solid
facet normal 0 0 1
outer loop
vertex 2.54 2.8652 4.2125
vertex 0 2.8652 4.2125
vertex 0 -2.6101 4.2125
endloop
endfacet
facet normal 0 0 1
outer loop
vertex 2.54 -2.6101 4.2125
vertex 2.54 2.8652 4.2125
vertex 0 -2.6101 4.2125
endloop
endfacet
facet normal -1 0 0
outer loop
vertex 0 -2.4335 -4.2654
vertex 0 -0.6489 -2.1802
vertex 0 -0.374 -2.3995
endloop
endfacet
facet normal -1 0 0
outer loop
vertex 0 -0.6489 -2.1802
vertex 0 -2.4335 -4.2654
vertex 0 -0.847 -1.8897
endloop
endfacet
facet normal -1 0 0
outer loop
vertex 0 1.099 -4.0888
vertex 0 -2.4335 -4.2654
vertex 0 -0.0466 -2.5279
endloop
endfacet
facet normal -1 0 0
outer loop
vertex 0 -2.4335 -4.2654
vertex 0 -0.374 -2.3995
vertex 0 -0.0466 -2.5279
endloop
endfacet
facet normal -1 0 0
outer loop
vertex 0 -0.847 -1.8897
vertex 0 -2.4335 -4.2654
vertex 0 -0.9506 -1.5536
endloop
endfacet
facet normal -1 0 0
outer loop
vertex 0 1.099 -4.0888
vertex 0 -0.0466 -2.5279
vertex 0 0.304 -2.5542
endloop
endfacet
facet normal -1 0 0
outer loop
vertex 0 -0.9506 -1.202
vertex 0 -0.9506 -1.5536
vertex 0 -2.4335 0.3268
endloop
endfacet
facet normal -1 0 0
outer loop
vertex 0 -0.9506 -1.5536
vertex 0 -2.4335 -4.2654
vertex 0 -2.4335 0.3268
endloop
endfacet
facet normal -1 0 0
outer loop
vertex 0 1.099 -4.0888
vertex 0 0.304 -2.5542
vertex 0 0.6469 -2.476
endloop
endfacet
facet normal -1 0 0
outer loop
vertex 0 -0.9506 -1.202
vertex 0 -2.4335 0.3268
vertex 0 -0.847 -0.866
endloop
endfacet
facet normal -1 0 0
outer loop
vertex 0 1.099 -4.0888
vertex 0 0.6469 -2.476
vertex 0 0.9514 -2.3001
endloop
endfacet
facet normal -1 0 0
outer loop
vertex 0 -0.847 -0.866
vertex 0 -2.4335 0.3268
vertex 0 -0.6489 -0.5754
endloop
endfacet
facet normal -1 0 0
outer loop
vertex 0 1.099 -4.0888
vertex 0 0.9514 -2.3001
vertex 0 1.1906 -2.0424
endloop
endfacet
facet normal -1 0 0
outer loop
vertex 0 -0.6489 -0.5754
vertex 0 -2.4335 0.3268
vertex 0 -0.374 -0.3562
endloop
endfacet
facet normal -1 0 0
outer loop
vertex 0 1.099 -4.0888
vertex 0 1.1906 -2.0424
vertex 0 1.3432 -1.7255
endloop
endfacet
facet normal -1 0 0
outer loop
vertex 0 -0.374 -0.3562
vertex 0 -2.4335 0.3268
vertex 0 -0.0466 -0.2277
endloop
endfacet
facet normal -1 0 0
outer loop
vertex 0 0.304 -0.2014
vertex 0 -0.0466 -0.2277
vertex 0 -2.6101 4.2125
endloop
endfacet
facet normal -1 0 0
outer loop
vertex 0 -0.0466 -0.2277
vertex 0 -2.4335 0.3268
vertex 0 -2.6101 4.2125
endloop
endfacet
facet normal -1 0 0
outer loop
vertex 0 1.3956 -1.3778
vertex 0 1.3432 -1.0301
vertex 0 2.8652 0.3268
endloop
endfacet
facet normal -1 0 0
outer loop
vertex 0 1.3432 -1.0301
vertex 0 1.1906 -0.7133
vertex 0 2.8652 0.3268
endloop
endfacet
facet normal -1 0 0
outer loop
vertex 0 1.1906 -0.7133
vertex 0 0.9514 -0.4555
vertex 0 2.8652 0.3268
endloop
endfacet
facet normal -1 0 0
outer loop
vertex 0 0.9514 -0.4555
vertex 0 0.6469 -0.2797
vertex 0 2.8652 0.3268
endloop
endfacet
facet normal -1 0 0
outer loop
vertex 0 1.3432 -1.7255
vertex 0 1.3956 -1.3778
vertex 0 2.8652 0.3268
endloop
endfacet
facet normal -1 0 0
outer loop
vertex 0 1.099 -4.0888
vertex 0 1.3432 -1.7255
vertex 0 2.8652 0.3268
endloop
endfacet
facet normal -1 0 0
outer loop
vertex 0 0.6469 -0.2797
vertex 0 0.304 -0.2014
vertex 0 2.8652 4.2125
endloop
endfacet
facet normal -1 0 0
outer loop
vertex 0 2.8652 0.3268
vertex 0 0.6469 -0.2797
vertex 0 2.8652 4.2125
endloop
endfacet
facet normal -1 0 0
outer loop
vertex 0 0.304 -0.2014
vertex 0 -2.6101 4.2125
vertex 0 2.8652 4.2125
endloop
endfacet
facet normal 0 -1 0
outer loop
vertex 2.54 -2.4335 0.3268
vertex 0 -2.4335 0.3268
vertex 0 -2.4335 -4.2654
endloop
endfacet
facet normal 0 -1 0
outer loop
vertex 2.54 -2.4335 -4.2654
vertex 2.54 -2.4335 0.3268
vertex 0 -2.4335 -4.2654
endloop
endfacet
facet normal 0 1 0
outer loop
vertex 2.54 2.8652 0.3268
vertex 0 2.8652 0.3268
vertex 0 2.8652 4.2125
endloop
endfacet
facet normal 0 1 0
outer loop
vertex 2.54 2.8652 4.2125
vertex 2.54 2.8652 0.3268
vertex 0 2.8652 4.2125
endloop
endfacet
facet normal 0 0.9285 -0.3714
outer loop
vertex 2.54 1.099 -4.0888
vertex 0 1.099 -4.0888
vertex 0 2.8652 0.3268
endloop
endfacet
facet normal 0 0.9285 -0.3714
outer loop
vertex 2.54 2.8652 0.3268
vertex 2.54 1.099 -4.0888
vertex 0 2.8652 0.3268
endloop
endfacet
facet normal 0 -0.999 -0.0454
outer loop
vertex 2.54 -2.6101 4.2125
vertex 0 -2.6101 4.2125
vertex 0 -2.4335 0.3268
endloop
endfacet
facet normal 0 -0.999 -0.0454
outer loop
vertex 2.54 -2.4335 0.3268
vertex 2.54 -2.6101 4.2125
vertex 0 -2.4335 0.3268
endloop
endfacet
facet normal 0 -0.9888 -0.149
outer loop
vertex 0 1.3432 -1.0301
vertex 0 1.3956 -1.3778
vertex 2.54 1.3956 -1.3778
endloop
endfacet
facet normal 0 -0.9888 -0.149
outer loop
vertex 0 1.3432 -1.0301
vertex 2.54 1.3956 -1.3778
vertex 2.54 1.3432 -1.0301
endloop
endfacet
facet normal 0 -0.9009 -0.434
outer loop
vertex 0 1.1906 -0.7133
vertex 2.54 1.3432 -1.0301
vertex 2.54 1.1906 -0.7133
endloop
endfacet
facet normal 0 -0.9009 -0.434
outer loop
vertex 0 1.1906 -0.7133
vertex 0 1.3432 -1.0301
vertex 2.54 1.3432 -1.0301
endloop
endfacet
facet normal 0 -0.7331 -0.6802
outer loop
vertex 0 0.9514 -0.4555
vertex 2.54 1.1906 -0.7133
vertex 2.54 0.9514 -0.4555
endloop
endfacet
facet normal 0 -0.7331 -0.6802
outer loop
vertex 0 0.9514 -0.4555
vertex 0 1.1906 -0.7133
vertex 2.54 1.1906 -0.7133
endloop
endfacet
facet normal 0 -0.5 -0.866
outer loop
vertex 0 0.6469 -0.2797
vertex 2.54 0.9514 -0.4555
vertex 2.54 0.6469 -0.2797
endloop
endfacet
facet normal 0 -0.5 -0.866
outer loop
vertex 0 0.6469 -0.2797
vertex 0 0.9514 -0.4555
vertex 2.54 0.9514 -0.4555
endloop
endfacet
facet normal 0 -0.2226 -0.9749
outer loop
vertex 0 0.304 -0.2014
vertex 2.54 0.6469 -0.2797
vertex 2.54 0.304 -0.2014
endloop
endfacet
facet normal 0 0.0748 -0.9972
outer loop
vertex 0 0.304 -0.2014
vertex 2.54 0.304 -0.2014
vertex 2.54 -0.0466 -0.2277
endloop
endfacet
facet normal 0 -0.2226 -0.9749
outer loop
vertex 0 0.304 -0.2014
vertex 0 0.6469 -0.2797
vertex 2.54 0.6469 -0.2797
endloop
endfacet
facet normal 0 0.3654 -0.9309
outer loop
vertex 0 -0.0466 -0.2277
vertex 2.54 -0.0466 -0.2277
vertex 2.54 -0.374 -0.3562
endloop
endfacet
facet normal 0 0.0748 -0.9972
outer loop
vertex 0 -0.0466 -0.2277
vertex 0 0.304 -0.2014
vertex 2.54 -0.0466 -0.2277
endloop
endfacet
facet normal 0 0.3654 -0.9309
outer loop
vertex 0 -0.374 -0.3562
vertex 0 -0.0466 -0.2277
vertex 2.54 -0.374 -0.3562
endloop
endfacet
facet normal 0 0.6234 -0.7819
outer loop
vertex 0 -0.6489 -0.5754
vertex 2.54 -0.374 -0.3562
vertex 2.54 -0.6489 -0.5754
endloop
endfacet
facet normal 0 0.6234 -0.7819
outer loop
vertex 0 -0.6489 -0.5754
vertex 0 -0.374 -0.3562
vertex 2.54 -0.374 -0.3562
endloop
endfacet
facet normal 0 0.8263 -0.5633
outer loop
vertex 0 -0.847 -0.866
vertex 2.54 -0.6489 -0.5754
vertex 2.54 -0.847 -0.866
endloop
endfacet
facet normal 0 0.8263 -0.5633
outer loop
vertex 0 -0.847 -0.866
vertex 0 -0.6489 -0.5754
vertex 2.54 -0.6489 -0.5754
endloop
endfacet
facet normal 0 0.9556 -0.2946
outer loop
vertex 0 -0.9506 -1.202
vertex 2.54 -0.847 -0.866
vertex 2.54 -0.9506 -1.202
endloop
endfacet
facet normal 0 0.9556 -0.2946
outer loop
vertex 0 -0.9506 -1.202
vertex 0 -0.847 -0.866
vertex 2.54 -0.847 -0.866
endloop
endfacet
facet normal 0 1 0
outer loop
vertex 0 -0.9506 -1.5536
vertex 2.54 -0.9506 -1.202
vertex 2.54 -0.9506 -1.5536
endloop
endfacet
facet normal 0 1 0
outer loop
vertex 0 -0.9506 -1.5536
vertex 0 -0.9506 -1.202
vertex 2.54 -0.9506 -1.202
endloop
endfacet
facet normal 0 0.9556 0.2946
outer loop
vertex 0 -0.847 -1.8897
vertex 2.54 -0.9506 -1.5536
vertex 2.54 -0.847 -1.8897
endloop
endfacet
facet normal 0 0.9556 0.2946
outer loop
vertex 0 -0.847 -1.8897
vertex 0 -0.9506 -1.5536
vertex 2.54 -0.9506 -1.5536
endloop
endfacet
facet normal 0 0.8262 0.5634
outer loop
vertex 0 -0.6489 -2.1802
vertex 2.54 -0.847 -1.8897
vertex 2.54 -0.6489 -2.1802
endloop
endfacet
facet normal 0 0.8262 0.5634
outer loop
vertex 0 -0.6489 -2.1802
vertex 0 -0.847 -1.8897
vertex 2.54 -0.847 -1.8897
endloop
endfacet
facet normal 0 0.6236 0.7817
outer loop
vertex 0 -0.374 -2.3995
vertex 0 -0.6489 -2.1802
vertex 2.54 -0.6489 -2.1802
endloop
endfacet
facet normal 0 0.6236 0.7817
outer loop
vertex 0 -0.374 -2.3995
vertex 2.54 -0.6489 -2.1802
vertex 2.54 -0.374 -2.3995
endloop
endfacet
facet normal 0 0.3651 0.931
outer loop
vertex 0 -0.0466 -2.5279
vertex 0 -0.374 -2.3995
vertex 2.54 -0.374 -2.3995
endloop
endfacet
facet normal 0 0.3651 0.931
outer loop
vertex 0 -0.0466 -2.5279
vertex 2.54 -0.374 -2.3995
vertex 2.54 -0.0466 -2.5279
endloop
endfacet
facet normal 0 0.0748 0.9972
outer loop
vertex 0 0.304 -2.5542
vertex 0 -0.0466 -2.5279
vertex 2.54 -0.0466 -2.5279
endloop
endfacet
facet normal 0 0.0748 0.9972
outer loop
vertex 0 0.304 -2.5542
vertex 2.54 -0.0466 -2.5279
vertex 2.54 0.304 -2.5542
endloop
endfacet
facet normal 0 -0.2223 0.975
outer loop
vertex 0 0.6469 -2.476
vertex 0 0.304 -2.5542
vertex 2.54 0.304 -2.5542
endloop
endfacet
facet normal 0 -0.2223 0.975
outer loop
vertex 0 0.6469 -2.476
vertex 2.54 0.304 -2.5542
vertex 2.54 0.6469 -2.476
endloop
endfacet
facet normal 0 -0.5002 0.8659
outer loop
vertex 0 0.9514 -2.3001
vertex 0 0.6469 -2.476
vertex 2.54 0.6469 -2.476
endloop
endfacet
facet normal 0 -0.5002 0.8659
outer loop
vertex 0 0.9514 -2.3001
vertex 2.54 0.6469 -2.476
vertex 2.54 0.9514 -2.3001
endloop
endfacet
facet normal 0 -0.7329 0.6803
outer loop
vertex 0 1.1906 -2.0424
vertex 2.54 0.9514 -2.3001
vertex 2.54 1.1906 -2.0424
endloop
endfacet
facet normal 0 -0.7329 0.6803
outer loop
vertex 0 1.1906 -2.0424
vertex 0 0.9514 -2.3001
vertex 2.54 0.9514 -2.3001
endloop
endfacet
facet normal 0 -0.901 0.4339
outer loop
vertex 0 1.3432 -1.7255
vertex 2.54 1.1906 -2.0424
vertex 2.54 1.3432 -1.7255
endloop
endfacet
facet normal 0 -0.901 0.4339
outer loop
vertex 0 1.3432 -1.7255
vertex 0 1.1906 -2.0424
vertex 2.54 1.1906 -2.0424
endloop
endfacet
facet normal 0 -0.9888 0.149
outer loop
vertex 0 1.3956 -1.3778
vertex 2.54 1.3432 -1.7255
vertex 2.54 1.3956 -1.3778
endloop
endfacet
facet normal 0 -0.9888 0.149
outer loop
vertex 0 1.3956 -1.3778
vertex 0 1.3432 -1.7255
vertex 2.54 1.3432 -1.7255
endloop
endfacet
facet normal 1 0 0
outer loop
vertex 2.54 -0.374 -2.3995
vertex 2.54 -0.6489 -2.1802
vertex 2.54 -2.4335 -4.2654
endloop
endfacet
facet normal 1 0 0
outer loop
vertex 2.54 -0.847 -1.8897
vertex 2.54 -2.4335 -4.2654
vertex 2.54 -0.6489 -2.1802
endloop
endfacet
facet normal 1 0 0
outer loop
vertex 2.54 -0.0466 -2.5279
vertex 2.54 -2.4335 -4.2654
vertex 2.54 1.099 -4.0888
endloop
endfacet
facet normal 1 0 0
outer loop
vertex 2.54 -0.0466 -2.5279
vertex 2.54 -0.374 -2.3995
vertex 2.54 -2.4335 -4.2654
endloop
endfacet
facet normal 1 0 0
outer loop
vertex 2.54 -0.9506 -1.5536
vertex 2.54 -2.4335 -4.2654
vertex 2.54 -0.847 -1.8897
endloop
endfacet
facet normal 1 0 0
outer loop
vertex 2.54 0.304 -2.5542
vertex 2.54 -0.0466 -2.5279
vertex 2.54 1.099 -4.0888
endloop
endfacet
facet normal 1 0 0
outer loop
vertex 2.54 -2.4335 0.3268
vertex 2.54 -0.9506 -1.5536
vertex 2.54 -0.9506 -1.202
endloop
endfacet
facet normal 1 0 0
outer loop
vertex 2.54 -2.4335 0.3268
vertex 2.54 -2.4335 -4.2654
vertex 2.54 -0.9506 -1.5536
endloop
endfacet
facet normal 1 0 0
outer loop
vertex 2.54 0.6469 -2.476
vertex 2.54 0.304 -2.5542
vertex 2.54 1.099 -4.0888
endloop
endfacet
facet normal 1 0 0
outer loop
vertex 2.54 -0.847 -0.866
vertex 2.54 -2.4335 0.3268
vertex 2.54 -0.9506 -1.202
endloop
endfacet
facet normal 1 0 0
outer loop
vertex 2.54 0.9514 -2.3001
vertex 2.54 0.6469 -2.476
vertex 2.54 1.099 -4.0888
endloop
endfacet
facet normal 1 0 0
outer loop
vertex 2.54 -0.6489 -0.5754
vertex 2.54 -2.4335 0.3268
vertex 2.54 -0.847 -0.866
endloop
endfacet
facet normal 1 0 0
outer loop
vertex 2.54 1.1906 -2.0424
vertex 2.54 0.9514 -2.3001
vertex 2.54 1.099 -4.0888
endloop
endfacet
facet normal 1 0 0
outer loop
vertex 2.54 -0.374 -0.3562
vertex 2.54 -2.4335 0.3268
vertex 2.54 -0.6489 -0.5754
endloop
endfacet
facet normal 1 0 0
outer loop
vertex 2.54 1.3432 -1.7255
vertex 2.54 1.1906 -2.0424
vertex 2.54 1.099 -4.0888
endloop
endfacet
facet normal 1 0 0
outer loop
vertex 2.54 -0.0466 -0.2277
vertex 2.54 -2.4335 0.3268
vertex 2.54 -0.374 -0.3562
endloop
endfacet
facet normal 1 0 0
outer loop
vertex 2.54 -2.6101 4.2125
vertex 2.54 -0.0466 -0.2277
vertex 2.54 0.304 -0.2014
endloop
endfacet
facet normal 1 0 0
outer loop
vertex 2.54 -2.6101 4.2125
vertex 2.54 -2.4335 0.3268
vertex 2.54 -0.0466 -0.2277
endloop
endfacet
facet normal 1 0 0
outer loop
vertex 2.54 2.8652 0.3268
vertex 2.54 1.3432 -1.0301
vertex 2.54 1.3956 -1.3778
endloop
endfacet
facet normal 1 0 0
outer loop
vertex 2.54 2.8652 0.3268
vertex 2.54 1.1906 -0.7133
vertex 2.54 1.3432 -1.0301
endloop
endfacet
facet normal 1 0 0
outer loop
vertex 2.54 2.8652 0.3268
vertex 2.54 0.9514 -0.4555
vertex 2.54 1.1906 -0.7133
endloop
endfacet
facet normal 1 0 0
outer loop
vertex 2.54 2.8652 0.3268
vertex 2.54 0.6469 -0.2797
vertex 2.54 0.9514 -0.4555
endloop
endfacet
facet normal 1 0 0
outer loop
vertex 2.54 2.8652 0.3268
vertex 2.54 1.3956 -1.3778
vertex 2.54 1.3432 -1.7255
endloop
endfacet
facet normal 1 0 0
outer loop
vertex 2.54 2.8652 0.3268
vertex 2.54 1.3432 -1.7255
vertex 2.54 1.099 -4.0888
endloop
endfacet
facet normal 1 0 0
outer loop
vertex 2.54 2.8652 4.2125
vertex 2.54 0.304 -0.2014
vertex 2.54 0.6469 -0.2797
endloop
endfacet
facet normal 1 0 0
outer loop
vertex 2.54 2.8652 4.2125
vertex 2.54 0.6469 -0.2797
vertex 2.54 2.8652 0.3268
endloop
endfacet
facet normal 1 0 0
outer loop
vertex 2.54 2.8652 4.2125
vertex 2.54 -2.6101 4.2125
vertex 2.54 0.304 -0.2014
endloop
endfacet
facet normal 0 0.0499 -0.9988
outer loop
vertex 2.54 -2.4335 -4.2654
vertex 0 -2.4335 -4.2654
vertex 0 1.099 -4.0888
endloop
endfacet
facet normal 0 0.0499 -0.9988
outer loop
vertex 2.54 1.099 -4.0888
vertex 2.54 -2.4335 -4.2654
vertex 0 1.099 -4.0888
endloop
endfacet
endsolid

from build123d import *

# Parameters (mm, degrees)
F0_R     = 1.179689
F1_DEPTH = 2.54


with BuildPart() as f1:
    # F0 (on Right) → F1 (new body)
    with BuildSketch(Plane.YZ):
        Polygon((2.86521, 4.212468), (-2.610088, 4.212468), (-2.433466, 0.326772), (2.86521, 0.326772), align=None)
        Polygon((2.86521, 0.326772), (-2.433466, 0.326772), (-2.433466, -4.265413), (1.098984, -4.08879), align=None)
        with Locations((0.215872, -1.377823)):
            Circle(F0_R, mode=Mode.SUBTRACT)
    extrude(amount=F1_DEPTH)


solid = f1.part
